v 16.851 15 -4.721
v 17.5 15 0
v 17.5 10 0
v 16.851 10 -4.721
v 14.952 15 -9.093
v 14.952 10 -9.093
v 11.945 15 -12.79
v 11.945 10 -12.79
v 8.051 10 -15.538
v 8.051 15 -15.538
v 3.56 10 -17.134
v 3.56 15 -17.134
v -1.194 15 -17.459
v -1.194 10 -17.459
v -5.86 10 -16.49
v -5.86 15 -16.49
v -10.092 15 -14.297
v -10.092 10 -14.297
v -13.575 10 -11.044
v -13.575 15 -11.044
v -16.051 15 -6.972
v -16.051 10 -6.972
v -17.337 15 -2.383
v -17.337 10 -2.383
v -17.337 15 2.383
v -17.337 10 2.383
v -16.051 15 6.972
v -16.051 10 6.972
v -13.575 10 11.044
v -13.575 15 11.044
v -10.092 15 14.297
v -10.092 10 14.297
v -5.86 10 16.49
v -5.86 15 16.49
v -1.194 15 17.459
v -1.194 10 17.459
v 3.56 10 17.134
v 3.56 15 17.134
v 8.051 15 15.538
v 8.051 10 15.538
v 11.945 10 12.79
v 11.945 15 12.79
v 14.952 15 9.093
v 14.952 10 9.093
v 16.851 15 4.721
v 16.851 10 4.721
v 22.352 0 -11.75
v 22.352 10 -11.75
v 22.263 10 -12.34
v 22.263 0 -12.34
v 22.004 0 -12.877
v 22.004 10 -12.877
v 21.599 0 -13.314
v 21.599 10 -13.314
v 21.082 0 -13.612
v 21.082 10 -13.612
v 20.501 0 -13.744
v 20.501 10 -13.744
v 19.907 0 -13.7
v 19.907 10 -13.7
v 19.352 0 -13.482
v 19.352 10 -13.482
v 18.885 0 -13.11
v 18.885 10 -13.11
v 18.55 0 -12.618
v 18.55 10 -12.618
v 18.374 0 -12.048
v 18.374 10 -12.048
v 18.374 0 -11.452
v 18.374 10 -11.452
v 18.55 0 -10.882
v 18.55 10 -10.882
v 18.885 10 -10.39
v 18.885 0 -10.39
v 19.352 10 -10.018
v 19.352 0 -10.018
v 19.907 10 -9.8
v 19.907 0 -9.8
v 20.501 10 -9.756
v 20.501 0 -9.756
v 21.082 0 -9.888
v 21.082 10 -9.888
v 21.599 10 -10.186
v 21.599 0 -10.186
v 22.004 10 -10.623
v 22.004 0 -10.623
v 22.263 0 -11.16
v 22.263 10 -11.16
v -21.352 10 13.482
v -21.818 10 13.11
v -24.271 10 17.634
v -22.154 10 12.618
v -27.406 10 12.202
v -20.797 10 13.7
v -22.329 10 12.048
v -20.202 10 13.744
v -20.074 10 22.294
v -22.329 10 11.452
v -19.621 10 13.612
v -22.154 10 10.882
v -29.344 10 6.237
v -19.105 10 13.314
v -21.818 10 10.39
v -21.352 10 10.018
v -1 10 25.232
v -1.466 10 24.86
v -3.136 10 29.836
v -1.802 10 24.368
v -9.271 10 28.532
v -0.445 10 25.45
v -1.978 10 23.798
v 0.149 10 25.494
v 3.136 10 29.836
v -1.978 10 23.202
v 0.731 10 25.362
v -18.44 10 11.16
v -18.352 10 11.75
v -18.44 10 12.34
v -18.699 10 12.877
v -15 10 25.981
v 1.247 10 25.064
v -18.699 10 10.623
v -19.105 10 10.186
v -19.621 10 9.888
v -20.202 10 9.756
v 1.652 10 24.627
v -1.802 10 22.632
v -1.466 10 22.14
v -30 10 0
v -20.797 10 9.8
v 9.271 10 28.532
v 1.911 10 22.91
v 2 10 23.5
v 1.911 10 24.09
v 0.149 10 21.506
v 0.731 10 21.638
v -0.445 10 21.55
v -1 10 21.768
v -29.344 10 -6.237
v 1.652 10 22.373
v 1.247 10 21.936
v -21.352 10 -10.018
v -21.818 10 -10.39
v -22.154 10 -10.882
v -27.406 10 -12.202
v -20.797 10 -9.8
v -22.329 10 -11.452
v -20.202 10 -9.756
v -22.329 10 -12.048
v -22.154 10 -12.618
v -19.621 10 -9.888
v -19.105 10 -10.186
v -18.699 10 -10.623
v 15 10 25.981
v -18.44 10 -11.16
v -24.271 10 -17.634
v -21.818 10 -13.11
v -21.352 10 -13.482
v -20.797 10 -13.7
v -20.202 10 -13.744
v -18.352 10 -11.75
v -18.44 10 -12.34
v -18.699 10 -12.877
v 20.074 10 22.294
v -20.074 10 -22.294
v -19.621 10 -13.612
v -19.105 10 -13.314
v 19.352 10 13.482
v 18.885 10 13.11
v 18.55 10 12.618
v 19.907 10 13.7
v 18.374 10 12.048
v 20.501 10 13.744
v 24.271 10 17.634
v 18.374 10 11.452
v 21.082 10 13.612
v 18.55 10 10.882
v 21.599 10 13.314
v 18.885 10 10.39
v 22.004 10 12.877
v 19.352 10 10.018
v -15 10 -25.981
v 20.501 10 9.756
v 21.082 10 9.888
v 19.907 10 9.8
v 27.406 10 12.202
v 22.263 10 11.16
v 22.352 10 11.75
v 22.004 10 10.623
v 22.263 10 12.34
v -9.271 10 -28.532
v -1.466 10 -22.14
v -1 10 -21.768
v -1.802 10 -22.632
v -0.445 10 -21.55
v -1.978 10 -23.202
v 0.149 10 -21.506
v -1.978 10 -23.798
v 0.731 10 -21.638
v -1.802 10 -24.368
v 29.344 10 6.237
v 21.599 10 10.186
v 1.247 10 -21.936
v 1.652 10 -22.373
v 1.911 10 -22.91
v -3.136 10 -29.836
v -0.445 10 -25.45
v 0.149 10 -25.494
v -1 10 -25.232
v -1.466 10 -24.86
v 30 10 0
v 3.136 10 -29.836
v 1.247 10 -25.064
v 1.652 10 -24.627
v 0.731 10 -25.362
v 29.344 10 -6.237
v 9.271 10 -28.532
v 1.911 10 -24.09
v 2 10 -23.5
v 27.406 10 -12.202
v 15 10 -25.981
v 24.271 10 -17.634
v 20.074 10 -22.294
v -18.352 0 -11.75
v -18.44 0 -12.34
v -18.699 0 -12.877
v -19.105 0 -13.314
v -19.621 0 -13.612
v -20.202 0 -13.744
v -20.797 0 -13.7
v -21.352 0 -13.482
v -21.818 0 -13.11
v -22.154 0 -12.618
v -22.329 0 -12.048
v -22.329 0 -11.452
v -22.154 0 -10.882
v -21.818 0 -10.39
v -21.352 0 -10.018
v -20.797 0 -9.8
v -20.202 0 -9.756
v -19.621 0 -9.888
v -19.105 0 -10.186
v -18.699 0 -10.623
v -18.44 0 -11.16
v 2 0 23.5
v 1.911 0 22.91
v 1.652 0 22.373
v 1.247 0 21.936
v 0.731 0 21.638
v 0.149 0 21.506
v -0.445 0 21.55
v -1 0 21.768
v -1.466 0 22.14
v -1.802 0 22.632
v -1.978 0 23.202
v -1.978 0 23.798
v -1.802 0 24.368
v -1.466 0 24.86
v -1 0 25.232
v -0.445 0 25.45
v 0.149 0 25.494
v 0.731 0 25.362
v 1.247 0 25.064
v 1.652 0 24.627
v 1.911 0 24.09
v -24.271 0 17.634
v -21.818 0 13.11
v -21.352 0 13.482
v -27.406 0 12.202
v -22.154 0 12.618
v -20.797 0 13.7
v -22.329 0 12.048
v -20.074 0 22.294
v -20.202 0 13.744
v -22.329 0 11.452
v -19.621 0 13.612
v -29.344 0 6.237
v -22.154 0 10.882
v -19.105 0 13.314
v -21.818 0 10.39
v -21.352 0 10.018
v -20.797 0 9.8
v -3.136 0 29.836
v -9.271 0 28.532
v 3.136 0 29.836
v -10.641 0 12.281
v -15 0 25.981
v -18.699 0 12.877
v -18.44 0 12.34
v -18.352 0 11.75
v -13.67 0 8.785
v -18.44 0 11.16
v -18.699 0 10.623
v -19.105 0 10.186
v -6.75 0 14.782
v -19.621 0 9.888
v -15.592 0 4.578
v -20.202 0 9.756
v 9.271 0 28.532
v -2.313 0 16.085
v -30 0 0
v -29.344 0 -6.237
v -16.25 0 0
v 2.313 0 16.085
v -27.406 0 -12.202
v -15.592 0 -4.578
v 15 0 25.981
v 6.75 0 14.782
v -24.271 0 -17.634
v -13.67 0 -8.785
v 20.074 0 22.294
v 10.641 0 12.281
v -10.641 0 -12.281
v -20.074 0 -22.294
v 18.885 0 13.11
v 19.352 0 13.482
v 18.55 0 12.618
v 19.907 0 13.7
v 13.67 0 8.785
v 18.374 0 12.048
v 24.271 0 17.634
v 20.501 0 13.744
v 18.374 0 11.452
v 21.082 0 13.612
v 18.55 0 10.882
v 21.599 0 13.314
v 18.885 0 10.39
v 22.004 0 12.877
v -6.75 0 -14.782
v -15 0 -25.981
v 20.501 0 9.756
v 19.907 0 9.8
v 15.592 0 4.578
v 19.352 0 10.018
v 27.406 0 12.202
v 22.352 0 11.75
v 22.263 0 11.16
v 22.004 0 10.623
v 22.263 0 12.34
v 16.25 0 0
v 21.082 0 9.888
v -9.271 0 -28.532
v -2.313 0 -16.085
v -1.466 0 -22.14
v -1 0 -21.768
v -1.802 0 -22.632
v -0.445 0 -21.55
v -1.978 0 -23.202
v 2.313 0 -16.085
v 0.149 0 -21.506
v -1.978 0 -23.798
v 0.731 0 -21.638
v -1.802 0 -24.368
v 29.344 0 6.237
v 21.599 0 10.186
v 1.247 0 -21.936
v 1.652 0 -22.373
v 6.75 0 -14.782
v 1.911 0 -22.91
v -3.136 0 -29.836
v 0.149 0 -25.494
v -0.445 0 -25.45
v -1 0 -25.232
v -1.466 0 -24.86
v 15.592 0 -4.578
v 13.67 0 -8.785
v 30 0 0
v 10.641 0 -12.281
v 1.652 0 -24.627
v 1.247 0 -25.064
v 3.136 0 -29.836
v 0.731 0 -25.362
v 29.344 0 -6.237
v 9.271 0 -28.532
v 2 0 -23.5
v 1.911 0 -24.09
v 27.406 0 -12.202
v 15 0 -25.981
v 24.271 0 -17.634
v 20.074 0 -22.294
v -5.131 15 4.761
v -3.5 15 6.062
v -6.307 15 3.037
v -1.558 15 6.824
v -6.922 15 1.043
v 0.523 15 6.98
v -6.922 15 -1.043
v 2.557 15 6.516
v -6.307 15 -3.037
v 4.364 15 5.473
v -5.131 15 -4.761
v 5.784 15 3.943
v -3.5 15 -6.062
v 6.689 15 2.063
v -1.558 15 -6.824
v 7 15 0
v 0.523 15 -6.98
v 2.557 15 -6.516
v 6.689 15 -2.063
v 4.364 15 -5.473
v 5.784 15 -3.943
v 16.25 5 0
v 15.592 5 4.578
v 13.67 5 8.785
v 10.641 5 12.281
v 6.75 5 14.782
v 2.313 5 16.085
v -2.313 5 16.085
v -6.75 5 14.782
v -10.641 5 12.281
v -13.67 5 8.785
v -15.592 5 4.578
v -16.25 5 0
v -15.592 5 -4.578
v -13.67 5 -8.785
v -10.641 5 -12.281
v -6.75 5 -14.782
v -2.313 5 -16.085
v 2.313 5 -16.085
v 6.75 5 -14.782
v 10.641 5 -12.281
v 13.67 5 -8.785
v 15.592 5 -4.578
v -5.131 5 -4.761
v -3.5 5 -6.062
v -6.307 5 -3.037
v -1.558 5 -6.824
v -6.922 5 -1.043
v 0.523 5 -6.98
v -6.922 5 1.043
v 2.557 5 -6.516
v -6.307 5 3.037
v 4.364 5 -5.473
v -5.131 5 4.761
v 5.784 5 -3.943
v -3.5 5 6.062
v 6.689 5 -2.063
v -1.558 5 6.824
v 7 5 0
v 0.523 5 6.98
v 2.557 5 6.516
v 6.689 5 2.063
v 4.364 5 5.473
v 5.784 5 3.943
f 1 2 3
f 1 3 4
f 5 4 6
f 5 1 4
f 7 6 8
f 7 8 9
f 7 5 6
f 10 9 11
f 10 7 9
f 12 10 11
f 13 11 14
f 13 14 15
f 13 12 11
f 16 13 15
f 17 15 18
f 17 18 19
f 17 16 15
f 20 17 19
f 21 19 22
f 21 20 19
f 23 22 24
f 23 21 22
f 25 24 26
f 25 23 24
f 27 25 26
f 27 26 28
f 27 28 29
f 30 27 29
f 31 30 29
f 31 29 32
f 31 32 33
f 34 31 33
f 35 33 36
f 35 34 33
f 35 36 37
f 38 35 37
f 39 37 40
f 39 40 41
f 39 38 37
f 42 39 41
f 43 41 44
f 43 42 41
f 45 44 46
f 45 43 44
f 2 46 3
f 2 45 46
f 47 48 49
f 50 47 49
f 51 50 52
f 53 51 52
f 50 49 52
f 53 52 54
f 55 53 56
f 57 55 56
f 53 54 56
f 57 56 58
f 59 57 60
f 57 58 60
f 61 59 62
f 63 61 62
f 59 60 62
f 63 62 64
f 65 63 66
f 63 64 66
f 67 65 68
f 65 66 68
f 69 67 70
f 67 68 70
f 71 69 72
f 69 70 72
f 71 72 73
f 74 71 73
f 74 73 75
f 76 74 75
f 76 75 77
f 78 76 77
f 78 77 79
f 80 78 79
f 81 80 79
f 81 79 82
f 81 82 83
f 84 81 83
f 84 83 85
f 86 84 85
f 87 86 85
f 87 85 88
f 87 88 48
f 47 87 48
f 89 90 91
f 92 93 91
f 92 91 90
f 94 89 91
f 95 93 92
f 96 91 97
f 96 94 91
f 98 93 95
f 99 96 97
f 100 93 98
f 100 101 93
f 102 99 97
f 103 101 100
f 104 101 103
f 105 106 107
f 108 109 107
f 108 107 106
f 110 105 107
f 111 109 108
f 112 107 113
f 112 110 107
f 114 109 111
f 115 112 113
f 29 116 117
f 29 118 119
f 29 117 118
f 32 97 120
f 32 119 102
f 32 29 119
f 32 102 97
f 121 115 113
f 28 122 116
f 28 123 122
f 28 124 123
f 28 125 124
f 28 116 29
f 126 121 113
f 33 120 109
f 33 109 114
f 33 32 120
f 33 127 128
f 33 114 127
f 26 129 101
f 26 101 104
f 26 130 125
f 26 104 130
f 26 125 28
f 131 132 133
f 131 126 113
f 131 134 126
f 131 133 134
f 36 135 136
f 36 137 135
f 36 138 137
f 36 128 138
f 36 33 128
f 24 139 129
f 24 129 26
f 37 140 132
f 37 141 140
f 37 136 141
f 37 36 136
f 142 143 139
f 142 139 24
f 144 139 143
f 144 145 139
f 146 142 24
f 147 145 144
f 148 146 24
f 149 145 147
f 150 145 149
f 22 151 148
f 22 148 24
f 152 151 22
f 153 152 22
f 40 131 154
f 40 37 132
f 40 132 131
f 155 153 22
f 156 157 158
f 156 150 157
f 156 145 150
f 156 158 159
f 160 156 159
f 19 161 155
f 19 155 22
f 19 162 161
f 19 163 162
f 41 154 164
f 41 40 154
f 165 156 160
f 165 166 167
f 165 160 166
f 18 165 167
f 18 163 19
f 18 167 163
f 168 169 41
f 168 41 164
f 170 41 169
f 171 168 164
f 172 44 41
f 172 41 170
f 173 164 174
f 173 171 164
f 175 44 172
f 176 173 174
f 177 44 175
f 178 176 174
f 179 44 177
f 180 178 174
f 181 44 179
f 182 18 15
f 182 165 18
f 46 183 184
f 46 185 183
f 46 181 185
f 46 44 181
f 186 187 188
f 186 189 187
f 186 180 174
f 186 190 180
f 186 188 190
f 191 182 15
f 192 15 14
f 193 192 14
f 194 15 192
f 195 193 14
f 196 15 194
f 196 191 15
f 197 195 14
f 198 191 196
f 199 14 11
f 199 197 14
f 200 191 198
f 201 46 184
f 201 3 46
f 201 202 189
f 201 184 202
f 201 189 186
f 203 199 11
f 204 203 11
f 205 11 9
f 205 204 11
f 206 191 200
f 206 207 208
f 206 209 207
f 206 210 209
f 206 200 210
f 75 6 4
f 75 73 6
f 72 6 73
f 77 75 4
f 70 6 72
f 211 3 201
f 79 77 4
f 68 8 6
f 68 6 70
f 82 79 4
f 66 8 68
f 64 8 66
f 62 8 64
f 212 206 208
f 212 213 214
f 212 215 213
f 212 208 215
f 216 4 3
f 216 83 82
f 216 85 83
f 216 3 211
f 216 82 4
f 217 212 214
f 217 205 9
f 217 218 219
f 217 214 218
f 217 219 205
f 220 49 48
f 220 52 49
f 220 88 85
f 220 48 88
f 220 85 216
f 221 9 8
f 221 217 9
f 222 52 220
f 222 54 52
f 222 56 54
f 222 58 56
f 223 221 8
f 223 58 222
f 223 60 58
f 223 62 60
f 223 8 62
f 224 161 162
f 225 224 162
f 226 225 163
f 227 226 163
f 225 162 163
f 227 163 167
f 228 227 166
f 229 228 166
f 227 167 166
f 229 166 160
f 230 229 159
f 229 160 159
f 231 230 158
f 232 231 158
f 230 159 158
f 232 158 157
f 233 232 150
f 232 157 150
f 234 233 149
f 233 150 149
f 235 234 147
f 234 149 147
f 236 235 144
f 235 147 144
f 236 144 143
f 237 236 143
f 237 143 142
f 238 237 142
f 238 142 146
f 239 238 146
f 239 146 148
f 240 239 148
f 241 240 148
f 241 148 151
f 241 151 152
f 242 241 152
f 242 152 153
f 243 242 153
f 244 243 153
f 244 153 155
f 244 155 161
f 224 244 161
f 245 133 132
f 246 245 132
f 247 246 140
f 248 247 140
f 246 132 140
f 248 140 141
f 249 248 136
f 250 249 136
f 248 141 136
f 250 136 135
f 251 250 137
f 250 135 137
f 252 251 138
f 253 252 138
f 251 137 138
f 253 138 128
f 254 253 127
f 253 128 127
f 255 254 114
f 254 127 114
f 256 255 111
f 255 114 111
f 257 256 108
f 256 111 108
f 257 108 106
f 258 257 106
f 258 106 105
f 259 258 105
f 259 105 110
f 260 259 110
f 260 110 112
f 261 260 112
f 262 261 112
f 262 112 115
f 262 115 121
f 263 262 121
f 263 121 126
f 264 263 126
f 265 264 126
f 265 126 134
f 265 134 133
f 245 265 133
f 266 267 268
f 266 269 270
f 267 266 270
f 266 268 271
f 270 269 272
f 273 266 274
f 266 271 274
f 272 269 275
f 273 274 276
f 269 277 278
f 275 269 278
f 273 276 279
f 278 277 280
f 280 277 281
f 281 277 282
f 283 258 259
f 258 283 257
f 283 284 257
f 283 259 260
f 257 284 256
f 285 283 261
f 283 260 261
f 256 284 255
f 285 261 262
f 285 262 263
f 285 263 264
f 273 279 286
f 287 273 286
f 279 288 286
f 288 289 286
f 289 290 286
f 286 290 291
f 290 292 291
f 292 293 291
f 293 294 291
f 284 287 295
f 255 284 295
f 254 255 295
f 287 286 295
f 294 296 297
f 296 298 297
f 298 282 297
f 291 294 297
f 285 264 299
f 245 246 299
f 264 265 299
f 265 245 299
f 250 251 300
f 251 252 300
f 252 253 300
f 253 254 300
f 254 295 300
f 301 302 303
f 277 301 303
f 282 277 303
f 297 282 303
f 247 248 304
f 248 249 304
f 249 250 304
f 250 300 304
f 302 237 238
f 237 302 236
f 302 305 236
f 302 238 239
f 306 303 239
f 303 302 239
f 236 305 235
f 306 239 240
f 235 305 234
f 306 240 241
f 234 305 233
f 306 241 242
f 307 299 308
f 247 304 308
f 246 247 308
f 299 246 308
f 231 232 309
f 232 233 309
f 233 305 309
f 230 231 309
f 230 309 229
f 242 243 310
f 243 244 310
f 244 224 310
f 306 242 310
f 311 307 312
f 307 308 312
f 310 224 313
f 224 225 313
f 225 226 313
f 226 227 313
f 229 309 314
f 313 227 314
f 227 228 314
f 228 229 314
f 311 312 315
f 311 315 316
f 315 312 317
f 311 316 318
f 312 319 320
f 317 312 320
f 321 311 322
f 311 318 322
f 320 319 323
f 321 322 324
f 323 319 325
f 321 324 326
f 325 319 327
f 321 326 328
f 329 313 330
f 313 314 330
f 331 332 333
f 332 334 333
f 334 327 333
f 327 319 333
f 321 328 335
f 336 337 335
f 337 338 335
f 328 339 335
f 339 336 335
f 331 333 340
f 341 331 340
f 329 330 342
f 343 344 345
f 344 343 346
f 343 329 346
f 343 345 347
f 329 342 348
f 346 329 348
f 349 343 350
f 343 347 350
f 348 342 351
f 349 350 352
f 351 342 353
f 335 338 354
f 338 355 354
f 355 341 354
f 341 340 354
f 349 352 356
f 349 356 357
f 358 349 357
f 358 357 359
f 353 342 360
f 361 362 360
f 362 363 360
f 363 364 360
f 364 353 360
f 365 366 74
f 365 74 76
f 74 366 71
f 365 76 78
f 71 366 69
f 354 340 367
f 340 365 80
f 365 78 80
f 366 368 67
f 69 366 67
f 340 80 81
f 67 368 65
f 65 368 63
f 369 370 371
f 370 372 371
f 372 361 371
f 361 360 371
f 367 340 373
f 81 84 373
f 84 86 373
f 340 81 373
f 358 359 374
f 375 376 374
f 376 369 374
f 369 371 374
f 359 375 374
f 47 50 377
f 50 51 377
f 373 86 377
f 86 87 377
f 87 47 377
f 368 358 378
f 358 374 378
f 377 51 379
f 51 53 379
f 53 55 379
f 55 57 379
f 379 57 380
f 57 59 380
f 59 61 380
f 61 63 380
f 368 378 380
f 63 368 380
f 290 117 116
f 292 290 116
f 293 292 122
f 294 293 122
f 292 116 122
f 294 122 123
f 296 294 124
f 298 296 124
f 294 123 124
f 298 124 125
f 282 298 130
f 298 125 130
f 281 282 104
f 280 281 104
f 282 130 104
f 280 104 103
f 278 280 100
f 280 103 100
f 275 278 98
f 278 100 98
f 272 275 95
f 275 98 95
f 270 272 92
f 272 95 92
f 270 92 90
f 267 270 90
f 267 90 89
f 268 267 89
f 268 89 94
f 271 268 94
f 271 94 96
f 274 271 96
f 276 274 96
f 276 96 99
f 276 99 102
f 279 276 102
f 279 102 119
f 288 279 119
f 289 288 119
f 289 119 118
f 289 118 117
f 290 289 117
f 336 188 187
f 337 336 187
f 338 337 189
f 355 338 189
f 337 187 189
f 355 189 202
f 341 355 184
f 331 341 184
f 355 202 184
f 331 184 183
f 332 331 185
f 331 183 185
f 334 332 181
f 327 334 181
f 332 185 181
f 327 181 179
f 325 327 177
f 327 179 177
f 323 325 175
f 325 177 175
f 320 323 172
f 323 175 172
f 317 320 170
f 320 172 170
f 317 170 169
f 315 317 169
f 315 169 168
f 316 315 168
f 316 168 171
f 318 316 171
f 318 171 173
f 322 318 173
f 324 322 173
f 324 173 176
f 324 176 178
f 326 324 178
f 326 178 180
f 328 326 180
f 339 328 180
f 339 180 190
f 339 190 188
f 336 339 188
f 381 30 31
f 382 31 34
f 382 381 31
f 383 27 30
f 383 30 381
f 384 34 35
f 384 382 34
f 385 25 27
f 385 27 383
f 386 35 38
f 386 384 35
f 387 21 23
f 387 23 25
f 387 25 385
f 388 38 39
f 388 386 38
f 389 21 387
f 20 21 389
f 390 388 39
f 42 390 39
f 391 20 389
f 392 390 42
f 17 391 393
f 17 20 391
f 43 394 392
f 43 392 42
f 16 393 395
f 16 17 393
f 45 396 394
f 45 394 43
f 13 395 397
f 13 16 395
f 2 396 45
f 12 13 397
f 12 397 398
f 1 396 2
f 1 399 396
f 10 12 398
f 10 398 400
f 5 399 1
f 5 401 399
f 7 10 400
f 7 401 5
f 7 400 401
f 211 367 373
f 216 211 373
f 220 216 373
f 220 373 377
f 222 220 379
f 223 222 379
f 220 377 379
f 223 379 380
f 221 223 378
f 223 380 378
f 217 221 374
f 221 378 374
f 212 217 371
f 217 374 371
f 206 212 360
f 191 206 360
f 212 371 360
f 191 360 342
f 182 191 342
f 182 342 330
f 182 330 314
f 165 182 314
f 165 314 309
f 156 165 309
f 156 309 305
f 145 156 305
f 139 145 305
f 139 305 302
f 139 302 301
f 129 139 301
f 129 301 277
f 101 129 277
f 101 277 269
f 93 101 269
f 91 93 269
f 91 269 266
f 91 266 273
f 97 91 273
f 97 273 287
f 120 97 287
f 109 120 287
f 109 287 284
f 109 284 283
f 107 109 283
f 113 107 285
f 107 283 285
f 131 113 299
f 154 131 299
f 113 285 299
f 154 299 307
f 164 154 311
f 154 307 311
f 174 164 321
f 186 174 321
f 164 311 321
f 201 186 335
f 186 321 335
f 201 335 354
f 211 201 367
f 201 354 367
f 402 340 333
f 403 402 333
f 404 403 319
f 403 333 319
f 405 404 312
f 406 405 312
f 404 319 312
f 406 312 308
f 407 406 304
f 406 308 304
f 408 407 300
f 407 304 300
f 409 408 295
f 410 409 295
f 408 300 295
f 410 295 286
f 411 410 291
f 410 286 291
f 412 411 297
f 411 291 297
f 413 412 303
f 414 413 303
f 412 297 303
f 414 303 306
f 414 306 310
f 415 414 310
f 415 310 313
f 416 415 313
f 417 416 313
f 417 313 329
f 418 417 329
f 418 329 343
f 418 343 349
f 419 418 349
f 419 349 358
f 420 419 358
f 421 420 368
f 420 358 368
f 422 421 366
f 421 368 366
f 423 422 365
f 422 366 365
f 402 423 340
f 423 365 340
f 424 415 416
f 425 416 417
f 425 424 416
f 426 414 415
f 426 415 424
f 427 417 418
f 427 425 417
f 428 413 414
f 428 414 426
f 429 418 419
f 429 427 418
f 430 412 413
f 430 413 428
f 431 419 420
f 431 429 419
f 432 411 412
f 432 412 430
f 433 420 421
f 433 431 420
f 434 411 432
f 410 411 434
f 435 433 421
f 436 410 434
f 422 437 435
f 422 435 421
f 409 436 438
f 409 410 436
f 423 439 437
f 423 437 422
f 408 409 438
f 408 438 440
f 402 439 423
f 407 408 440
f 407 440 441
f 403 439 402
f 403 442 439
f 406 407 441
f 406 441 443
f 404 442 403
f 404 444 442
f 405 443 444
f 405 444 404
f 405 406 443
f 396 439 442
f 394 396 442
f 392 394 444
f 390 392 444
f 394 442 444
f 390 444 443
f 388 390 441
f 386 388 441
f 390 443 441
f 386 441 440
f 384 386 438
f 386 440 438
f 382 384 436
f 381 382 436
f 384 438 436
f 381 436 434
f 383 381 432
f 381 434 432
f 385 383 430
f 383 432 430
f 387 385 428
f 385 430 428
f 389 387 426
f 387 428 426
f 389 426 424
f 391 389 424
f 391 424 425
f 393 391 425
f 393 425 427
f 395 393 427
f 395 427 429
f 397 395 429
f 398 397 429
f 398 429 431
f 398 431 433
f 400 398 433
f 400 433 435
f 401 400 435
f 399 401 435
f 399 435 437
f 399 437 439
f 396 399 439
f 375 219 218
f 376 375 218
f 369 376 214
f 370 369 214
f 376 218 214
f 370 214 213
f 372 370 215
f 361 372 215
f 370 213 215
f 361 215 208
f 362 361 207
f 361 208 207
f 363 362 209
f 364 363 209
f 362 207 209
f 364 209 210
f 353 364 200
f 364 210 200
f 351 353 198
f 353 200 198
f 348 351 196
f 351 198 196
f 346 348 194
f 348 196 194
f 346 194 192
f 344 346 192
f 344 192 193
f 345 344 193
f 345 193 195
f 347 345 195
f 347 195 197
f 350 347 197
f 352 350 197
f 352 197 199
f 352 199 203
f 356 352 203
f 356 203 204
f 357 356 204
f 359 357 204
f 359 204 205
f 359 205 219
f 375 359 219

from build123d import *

# Parameters (mm, degrees)
SKETCH1_R           = 30
BOSS_EXTRUDE1_DEPTH = 15
SKETCH3_R           = 16.25
CUT_EXTRUDE1_DEPTH  = 5
SKETCH4_R           = 7
CUT_EXTRUDE2_DEPTH  = 11
SKETCH5_R           = 30
SKETCH5_R_2         = 17.5
CUT_EXTRUDE3_DEPTH  = 5
SKETCH6_R           = 2
CUT_EXTRUDE4_DEPTH  = 11


with BuildPart() as part:
    # Sketch1 → Boss-Extrude1 (new body)
    with BuildSketch(Plane(origin=(0, 0, 0), x_dir=(1, 0, 0), z_dir=(0, 1, 0))):
        Circle(SKETCH1_R)
    extrude(amount=BOSS_EXTRUDE1_DEPTH)

    # Sketch3 → Cut-Extrude1 (cut)
    with BuildSketch(Plane.XZ):
        Circle(SKETCH3_R)
    extrude(amount=-CUT_EXTRUDE1_DEPTH, mode=Mode.SUBTRACT)

    # Sketch4 → Cut-Extrude2 (cut, through all)
    with BuildSketch(Plane.XZ.offset(-5)):
        Circle(SKETCH4_R)
    extrude(amount=-CUT_EXTRUDE2_DEPTH, mode=Mode.SUBTRACT)

    # Sketch5 → Cut-Extrude3 (cut)
    with BuildSketch(Plane(origin=(0, 15, 0), x_dir=(1, 0, 0), z_dir=(0, 1, 0))):
        Circle(SKETCH5_R)
        Circle(SKETCH5_R_2, mode=Mode.SUBTRACT)
    extrude(amount=-CUT_EXTRUDE3_DEPTH, mode=Mode.SUBTRACT)

    # Sketch6 → Cut-Extrude4 (cut, through all)
    with BuildSketch(Plane(origin=(0, 10, 0), x_dir=(1, 0, 0), z_dir=(0, 1, 0))):
        with Locations((0, 23.5)):
            Circle(SKETCH6_R)
        with Locations((20.351596989, 11.75)):
            Circle(SKETCH6_R)
        with Locations((20.351596989, -11.75)):
            Circle(SKETCH6_R)
        with Locations((0, -23.5)):
            Circle(SKETCH6_R)
        with Locations((-20.351596989, -11.75)):
            Circle(SKETCH6_R)
        with Locations((-20.351596989, 11.75)):
            Circle(SKETCH6_R)
    extrude(amount=-CUT_EXTRUDE4_DEPTH, mode=Mode.SUBTRACT)


solid = part.part
